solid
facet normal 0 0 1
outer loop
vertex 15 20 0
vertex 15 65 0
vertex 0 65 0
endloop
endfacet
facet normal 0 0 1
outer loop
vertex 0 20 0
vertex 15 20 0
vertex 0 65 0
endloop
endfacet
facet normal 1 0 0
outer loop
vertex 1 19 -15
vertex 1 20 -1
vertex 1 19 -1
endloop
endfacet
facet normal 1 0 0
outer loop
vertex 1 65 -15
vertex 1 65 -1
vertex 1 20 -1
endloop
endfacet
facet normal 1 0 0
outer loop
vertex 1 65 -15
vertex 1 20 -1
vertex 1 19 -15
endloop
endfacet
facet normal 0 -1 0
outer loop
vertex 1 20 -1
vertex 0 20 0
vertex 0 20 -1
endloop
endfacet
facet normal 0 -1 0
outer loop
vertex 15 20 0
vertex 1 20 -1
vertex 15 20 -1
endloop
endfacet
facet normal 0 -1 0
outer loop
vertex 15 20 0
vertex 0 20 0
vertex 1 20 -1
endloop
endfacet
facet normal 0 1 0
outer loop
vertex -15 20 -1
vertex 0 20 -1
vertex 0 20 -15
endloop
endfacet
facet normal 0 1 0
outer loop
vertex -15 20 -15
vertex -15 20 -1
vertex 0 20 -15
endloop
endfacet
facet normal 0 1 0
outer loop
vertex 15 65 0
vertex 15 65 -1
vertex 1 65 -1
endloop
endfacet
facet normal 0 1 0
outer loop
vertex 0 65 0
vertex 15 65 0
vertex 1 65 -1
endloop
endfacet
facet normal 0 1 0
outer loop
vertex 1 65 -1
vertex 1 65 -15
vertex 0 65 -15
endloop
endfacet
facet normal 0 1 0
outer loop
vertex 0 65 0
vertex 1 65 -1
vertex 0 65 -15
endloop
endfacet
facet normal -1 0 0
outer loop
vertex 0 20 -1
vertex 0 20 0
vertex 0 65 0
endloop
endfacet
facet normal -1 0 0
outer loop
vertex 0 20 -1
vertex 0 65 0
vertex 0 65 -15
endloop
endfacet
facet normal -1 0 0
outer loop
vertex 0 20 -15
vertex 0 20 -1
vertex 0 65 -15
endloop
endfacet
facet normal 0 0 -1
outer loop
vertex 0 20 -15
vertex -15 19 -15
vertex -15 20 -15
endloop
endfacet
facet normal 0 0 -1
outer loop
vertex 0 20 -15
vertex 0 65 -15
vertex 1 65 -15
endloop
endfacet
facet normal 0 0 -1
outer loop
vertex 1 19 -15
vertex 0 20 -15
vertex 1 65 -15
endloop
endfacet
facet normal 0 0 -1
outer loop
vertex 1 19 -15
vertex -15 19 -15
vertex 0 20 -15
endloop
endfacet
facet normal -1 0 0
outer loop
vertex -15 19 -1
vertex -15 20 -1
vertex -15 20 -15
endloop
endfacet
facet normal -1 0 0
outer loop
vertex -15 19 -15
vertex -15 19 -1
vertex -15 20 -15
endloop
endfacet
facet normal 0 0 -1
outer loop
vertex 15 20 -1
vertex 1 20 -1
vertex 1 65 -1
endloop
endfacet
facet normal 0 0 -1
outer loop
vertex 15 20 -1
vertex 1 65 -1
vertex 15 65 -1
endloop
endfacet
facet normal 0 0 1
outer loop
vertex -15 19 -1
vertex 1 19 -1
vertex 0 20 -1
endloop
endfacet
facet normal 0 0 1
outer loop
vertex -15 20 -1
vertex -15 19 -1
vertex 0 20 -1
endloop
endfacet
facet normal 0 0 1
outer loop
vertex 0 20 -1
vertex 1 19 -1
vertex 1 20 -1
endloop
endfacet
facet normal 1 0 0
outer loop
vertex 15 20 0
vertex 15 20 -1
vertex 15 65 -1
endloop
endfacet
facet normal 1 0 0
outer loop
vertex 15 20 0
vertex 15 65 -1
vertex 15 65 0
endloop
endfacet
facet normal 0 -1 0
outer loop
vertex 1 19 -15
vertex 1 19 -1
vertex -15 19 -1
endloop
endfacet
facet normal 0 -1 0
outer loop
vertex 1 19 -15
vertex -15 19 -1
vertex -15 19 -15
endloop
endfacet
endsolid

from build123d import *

# Parameters (mm, degrees)
EXTRUDE_1_DEPTH     = 65
SKETCH_3_W          = 1
SKETCH_3_H          = 14
CUT_EXTRUDE_1_DEPTH = 20
SKETCH_5_W          = 14
SKETCH_5_H          = 1
EXTRUDE_4_DEPTH     = 16
SKETCH_6_W          = 15
SKETCH_6_H          = 1
CUT_EXTRUDE_2_DEPTH = 19
SKETCH_7_W          = 15
SKETCH_7_H          = 1
CUT_EXTRUDE_3_DEPTH = 1


with BuildPart() as part:
    # Эскиз1 → Бобышка-Вытянуть1 (new body)
    with BuildSketch(Plane(origin=(0, 0, 0), x_dir=(1, 0, 0), z_dir=(0, 1, 0))):
        Polygon((0, 0), (0, 15), (1, 15), (1, 1), (15, 1), (15, 0), align=None)
    extrude(amount=EXTRUDE_1_DEPTH)

    # Эскиз3 → Вырез-Вытянуть1 (cut)
    with BuildSketch(Plane.XZ):
        with Locations((0.5, -8)):
            Rectangle(SKETCH_3_W, SKETCH_3_H)
    extrude(amount=-CUT_EXTRUDE_1_DEPTH, mode=Mode.SUBTRACT)

    # Эскиз5 → Бобышка-Вытянуть4 (add)
    with BuildSketch(Plane(origin=(1, 0, 0), x_dir=(0, 0, -1), z_dir=(1, 0, 0))):
        with Locations((8, 19.5)):
            Rectangle(SKETCH_5_W, SKETCH_5_H)
    extrude(amount=-EXTRUDE_4_DEPTH)

    # Эскиз6 → Вырез-Вытянуть2 (cut)
    with BuildSketch(Plane.XZ):
        with Locations((7.5, -0.5)):
            Rectangle(SKETCH_6_W, SKETCH_6_H)
    extrude(amount=-CUT_EXTRUDE_2_DEPTH, mode=Mode.SUBTRACT)

    # Эскиз7 → Вырез-Вытянуть3 (cut)
    with BuildSketch(Plane.XZ.offset(-19)):
        with Locations((7.5, -0.5)):
            Rectangle(SKETCH_7_W, SKETCH_7_H)
    extrude(amount=-CUT_EXTRUDE_3_DEPTH, mode=Mode.SUBTRACT)


solid = part.part
